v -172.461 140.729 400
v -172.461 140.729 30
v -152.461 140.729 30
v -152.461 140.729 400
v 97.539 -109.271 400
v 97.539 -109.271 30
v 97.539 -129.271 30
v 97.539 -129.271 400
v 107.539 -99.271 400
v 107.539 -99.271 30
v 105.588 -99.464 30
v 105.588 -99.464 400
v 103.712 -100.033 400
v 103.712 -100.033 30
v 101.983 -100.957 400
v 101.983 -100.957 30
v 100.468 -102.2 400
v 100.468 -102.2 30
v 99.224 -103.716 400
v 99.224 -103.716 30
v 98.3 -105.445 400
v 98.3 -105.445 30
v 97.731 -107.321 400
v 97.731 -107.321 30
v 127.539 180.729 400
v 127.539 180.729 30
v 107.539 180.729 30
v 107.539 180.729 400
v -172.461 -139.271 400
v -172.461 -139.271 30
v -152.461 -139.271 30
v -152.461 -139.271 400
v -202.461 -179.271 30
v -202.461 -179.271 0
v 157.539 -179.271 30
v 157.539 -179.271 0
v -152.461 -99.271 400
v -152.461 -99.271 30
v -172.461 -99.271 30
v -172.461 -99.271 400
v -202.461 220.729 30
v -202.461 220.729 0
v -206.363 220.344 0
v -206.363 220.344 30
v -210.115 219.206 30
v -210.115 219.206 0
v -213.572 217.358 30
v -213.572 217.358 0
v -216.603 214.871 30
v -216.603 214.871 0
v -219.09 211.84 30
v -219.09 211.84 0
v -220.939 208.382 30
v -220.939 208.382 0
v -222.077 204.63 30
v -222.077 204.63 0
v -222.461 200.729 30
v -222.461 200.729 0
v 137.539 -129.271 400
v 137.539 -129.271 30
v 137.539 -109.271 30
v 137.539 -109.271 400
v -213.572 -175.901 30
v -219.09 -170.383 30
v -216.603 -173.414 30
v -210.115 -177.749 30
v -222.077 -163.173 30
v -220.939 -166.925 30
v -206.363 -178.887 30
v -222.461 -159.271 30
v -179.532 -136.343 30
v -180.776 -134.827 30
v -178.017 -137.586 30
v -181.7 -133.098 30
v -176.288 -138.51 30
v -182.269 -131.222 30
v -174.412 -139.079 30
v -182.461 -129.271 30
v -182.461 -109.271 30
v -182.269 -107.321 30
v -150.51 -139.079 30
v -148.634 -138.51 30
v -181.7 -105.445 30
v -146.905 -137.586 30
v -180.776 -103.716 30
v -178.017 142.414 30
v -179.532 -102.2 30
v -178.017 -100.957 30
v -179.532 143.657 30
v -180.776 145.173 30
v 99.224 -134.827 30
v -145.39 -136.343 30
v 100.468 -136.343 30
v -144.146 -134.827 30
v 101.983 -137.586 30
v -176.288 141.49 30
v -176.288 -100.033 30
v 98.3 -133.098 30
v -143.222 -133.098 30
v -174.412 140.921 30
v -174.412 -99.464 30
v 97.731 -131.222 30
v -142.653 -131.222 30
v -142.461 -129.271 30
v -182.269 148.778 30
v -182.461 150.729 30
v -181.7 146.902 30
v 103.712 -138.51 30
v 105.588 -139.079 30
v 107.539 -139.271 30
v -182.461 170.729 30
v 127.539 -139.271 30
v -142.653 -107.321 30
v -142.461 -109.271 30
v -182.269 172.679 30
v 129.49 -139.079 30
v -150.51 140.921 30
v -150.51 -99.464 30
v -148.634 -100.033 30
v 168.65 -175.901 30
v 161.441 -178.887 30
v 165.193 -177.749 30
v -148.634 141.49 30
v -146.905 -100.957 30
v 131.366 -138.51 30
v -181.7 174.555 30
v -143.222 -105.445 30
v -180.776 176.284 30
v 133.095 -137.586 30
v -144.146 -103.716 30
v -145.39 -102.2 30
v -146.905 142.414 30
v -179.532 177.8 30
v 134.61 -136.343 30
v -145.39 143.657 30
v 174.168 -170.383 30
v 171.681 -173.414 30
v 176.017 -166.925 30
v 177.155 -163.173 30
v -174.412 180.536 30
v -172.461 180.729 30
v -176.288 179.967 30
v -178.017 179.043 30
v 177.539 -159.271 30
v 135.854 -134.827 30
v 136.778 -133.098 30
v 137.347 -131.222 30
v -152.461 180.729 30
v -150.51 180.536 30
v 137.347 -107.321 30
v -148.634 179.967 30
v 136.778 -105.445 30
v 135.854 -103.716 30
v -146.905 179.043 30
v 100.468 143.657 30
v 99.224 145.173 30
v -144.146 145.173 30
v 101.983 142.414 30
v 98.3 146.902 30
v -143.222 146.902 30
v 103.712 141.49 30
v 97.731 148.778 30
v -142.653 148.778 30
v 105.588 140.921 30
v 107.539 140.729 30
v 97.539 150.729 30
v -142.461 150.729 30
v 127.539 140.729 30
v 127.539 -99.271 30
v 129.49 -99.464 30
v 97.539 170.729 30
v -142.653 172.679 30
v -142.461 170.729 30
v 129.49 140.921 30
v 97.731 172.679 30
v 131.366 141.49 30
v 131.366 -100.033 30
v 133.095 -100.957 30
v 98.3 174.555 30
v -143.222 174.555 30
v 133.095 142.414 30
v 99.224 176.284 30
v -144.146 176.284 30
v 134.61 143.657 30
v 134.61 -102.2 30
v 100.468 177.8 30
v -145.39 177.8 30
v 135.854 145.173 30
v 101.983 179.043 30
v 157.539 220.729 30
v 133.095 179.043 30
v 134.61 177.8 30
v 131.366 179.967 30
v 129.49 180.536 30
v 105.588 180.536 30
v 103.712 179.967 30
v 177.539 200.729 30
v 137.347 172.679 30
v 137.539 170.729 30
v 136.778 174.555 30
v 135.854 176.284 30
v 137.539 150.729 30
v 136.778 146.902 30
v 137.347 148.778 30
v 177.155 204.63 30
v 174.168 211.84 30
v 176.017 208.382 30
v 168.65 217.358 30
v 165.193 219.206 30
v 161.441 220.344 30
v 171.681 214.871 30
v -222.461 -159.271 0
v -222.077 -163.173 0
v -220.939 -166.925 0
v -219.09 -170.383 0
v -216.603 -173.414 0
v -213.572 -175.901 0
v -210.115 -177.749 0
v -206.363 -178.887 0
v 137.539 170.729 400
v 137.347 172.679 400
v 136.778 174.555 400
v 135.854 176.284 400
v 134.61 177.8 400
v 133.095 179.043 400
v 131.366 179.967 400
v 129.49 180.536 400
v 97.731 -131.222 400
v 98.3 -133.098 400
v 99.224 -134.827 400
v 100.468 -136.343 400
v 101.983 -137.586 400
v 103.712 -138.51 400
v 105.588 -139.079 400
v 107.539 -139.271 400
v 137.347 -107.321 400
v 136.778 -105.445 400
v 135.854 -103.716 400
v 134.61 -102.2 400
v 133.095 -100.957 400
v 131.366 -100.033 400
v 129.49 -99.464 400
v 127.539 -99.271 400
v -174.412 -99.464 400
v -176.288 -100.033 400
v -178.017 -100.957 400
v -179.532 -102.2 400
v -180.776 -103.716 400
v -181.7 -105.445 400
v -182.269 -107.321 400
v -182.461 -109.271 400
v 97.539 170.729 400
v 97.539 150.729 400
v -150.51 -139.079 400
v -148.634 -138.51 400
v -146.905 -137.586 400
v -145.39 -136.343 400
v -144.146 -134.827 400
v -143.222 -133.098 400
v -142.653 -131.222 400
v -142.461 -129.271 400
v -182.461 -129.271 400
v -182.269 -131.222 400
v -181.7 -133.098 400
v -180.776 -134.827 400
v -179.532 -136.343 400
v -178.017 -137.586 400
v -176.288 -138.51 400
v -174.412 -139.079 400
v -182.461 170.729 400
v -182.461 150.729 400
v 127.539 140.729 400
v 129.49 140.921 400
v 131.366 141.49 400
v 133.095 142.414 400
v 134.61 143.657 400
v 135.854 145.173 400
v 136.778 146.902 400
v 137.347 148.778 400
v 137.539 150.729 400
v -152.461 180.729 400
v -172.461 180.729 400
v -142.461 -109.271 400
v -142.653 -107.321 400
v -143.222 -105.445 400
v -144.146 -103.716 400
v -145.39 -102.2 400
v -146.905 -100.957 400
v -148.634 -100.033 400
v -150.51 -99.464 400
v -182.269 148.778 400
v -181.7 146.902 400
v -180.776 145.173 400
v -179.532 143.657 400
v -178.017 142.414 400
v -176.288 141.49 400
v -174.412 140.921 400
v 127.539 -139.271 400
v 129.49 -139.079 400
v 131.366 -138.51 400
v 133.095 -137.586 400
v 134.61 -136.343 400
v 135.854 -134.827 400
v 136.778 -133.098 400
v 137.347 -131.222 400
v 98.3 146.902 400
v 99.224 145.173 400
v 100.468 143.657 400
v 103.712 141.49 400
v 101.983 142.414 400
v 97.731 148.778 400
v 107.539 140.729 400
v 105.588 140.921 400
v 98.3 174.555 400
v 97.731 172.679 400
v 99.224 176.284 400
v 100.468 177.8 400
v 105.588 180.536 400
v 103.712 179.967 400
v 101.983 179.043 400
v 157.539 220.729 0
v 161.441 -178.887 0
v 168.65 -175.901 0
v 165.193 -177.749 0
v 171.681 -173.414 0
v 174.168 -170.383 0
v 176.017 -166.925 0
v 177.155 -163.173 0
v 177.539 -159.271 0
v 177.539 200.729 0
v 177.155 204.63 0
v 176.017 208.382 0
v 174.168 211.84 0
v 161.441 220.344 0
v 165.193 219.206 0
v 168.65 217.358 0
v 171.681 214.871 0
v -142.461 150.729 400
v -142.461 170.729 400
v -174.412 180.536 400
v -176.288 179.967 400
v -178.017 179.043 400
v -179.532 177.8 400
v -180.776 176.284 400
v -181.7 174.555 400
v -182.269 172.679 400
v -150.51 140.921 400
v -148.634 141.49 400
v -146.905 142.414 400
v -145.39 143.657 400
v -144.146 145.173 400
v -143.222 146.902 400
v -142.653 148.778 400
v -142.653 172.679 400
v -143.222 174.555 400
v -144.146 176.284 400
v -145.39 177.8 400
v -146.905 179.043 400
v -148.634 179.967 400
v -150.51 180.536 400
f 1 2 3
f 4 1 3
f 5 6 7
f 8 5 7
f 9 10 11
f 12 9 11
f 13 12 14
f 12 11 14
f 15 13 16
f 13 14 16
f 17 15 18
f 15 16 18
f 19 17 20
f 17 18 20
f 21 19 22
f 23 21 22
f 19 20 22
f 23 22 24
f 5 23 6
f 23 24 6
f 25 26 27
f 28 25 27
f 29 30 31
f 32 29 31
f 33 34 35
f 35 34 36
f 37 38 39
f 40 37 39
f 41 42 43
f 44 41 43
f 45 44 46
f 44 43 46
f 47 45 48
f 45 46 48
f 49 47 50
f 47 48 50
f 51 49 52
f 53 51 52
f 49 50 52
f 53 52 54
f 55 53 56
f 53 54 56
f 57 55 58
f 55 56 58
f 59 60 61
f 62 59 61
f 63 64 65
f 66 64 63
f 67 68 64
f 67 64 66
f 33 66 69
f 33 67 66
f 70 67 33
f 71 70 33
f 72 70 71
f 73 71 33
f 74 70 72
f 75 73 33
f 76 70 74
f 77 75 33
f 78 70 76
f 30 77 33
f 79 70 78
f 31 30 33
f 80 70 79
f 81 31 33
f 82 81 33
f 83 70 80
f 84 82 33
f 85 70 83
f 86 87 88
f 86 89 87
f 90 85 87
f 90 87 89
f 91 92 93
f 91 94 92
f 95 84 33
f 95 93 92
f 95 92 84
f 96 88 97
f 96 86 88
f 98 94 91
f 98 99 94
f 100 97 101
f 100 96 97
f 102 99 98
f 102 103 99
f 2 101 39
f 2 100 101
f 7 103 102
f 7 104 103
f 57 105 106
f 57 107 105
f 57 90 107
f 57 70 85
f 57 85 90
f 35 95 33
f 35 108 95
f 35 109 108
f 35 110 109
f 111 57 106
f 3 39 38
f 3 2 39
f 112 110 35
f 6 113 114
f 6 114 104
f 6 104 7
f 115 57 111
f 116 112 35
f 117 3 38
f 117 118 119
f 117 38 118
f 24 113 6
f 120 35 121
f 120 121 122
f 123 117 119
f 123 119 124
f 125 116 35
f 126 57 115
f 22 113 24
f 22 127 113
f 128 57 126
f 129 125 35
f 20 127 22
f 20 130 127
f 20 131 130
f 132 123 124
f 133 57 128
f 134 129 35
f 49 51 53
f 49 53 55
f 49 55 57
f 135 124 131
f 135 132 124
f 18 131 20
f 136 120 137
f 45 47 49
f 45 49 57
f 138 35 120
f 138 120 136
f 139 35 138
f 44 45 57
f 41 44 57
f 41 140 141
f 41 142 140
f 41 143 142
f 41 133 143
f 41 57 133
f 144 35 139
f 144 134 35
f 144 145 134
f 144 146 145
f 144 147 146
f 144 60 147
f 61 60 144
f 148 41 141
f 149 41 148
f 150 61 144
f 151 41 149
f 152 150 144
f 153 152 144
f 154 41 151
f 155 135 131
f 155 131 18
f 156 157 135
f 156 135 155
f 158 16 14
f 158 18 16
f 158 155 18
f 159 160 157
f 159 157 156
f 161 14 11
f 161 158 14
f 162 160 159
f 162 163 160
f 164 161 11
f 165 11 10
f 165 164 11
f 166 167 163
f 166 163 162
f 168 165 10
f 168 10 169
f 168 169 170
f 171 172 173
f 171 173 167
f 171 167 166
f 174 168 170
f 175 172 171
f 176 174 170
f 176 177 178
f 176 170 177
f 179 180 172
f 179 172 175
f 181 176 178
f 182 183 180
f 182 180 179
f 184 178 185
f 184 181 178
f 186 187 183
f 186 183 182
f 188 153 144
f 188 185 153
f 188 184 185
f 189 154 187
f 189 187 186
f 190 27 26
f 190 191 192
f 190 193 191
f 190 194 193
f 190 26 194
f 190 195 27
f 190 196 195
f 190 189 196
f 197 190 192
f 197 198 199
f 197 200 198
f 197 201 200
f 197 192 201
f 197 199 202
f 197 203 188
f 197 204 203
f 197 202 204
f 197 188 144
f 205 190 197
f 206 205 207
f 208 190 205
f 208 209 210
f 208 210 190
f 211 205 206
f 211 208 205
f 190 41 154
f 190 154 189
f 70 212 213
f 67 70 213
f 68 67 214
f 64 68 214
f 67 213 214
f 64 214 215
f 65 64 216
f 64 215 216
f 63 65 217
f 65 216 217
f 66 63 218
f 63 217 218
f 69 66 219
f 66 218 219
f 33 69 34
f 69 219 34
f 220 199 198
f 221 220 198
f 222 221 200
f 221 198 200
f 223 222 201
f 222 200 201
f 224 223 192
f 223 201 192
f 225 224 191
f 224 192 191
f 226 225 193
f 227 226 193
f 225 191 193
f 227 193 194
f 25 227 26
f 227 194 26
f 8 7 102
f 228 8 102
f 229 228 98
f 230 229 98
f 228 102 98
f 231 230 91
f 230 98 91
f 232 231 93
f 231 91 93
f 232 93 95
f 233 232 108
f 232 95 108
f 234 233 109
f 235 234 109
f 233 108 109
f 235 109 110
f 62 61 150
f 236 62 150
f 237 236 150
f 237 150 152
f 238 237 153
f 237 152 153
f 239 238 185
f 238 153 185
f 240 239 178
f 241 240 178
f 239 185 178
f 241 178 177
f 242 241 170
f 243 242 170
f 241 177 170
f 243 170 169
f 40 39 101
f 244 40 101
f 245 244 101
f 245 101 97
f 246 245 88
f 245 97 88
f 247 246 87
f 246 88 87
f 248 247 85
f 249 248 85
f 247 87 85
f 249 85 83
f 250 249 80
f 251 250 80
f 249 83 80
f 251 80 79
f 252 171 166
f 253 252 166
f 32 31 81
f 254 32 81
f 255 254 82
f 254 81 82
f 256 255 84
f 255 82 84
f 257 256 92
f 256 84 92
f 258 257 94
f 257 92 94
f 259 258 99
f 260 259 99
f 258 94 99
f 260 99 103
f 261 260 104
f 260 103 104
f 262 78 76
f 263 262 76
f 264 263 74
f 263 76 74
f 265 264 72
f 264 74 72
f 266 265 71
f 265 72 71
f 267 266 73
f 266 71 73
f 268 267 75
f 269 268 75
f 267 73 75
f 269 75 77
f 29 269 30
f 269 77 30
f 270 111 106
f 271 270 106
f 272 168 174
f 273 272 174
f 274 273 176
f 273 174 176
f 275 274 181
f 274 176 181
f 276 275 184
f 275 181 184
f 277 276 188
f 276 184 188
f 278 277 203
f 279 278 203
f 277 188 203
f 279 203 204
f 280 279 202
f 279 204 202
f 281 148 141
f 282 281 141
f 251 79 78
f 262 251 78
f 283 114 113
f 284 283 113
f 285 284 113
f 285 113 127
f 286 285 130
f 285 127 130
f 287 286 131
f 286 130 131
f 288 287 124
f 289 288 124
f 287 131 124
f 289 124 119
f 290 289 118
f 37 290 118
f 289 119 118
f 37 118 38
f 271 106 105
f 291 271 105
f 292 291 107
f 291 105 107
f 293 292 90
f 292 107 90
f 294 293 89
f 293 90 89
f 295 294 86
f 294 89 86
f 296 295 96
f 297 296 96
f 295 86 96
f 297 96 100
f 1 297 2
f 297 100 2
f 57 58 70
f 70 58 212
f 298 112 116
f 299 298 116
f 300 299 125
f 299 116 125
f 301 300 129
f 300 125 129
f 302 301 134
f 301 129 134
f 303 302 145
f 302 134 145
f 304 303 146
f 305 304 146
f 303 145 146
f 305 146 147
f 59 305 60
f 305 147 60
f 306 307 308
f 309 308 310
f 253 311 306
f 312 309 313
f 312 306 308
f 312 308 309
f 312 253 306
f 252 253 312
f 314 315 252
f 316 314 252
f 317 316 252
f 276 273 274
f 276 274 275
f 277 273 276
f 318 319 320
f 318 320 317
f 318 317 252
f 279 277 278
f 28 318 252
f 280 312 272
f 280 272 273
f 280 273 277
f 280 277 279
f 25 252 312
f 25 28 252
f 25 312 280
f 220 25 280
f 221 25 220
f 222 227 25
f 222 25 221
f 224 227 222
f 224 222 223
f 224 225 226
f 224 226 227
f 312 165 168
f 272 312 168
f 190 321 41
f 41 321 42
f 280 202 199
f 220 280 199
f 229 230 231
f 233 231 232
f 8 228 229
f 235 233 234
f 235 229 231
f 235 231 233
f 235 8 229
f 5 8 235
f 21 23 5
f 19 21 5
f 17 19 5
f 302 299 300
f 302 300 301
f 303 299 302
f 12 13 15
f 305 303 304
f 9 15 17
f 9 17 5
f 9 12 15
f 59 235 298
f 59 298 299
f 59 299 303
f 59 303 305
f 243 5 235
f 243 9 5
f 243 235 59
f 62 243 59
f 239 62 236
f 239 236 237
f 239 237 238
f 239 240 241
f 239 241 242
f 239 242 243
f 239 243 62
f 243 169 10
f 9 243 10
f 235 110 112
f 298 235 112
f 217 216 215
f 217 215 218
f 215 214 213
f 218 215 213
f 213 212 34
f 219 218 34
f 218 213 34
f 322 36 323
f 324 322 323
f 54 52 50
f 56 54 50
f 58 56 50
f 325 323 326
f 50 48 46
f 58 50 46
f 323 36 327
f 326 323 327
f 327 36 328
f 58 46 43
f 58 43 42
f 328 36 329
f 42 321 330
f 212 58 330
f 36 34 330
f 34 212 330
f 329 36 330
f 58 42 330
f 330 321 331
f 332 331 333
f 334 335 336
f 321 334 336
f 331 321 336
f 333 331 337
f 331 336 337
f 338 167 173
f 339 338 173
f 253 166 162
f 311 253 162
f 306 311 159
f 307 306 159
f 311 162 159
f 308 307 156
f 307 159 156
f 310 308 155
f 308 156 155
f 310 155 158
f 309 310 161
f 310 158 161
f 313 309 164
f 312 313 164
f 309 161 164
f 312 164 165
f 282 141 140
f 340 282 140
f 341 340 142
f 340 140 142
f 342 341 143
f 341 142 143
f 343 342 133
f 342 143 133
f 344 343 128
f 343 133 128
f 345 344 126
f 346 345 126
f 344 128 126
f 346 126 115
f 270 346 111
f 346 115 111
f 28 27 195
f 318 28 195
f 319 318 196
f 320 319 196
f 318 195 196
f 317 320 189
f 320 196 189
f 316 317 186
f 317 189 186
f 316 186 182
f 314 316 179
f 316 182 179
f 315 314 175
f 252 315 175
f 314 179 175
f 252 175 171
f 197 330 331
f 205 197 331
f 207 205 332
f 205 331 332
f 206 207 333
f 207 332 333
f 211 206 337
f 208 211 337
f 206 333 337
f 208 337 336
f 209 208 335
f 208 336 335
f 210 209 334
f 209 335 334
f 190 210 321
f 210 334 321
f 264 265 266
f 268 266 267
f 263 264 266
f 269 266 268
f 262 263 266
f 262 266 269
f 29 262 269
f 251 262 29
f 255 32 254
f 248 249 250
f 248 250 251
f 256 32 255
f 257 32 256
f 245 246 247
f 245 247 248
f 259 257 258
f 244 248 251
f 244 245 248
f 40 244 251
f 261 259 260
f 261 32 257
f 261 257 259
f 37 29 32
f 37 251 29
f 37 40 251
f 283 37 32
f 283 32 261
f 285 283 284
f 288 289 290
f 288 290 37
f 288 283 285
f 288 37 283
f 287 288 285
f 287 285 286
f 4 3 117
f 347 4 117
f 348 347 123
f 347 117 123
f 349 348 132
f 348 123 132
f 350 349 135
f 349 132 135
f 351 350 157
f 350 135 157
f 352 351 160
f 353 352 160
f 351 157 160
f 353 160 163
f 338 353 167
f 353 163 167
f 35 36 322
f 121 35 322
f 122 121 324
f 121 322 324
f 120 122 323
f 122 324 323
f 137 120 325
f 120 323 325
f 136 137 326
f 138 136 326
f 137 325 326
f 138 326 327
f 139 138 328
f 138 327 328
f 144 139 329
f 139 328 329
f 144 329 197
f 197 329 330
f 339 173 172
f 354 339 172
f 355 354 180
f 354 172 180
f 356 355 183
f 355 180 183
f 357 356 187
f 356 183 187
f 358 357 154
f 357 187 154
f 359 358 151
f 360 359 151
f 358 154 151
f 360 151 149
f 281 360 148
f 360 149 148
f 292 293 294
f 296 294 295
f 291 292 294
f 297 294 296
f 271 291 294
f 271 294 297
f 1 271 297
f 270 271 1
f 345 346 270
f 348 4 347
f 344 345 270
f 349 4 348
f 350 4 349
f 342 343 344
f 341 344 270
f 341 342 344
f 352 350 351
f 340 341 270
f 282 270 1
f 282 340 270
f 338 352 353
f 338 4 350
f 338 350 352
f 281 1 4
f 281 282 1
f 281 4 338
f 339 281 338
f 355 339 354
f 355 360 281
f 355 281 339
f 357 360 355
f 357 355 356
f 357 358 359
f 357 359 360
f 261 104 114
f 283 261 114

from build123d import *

# Parameters (mm, degrees)
F1_DEPTH = 30
F3_DEPTH = 370


with BuildPart() as f1:
    # F0 (on Top) → F1 (new body)
    with BuildSketch(Plane.XY):
        with BuildLine():
            Line((157.539008, 220.72852), (-202.460992, 220.72852))
            ThreePointArc((-202.460992, 220.72852), (-216.603128, 214.870655), (-222.460992, 200.72852))
            Line((-222.460992, 200.72852), (-222.460992, -159.27148))
            ThreePointArc((-222.460992, -159.27148), (-216.603128, -173.413616), (-202.460992, -179.27148))
            Line((-202.460992, -179.27148), (157.539008, -179.27148))
            ThreePointArc((157.539008, -179.27148), (171.681143, -173.413616), (177.539008, -159.27148))
            Line((177.539008, -159.27148), (177.539008, 200.72852))
            ThreePointArc((177.539008, 200.72852), (171.681143, 214.870655), (157.539008, 220.72852))
        make_face()
    extrude(amount=F1_DEPTH)

    # F2 (on face) → F3 (join)
    with BuildSketch(Plane.XY.offset(30)):
        with BuildLine():
            Line((-152.460992, 180.72852), (-172.460992, 180.72852))
            ThreePointArc((-172.460992, 180.72852), (-179.53206, 177.799588), (-182.460992, 170.72852))
            Line((-182.460992, 170.72852), (-182.460992, 150.72852))
            ThreePointArc((-182.460992, 150.72852), (-179.53206, 143.657452), (-172.460992, 140.72852))
            Line((-172.460992, 140.72852), (-152.460992, 140.72852))
            ThreePointArc((-152.460992, 140.72852), (-145.389924, 143.657452), (-142.460992, 150.72852))
            Line((-142.460992, 150.72852), (-142.460992, 170.72852))
            ThreePointArc((-142.460992, 170.72852), (-145.389924, 177.799588), (-152.460992, 180.72852))
        make_face()
        with BuildLine():
            Line((127.539008, 180.72852), (107.539008, 180.72852))
            ThreePointArc((107.539008, 180.72852), (100.46794, 177.799588), (97.539008, 170.72852))
            Line((97.539008, 170.72852), (97.539008, 150.72852))
            ThreePointArc((97.539008, 150.72852), (100.46794, 143.657452), (107.539008, 140.72852))
            Line((107.539008, 140.72852), (127.539008, 140.72852))
            ThreePointArc((127.539008, 140.72852), (134.610076, 143.657452), (137.539008, 150.72852))
            Line((137.539008, 150.72852), (137.539008, 170.72852))
            ThreePointArc((137.539008, 170.72852), (134.610076, 177.799588), (127.539008, 180.72852))
        make_face()
        with BuildLine():
            Line((127.539008, -99.27148), (107.539008, -99.27148))
            ThreePointArc((107.539008, -99.27148), (100.46794, -102.200412), (97.539008, -109.27148))
            Line((97.539008, -109.27148), (97.539008, -129.27148))
            ThreePointArc((97.539008, -129.27148), (100.46794, -136.342548), (107.539008, -139.27148))
            Line((107.539008, -139.27148), (127.539008, -139.27148))
            ThreePointArc((127.539008, -139.27148), (134.610076, -136.342548), (137.539008, -129.27148))
            Line((137.539008, -129.27148), (137.539008, -109.27148))
            ThreePointArc((137.539008, -109.27148), (134.610076, -102.200412), (127.539008, -99.27148))
        make_face()
        with BuildLine():
            Line((-152.460992, -99.27148), (-172.460992, -99.27148))
            ThreePointArc((-172.460992, -99.27148), (-179.53206, -102.200412), (-182.460992, -109.27148))
            Line((-182.460992, -109.27148), (-182.460992, -129.27148))
            ThreePointArc((-182.460992, -129.27148), (-179.53206, -136.342548), (-172.460992, -139.27148))
            Line((-172.460992, -139.27148), (-152.460992, -139.27148))
            ThreePointArc((-152.460992, -139.27148), (-145.389924, -136.342548), (-142.460992, -129.27148))
            Line((-142.460992, -129.27148), (-142.460992, -109.27148))
            ThreePointArc((-142.460992, -109.27148), (-145.389924, -102.200412), (-152.460992, -99.27148))
        make_face()
    extrude(amount=F3_DEPTH)


solid = f1.part
